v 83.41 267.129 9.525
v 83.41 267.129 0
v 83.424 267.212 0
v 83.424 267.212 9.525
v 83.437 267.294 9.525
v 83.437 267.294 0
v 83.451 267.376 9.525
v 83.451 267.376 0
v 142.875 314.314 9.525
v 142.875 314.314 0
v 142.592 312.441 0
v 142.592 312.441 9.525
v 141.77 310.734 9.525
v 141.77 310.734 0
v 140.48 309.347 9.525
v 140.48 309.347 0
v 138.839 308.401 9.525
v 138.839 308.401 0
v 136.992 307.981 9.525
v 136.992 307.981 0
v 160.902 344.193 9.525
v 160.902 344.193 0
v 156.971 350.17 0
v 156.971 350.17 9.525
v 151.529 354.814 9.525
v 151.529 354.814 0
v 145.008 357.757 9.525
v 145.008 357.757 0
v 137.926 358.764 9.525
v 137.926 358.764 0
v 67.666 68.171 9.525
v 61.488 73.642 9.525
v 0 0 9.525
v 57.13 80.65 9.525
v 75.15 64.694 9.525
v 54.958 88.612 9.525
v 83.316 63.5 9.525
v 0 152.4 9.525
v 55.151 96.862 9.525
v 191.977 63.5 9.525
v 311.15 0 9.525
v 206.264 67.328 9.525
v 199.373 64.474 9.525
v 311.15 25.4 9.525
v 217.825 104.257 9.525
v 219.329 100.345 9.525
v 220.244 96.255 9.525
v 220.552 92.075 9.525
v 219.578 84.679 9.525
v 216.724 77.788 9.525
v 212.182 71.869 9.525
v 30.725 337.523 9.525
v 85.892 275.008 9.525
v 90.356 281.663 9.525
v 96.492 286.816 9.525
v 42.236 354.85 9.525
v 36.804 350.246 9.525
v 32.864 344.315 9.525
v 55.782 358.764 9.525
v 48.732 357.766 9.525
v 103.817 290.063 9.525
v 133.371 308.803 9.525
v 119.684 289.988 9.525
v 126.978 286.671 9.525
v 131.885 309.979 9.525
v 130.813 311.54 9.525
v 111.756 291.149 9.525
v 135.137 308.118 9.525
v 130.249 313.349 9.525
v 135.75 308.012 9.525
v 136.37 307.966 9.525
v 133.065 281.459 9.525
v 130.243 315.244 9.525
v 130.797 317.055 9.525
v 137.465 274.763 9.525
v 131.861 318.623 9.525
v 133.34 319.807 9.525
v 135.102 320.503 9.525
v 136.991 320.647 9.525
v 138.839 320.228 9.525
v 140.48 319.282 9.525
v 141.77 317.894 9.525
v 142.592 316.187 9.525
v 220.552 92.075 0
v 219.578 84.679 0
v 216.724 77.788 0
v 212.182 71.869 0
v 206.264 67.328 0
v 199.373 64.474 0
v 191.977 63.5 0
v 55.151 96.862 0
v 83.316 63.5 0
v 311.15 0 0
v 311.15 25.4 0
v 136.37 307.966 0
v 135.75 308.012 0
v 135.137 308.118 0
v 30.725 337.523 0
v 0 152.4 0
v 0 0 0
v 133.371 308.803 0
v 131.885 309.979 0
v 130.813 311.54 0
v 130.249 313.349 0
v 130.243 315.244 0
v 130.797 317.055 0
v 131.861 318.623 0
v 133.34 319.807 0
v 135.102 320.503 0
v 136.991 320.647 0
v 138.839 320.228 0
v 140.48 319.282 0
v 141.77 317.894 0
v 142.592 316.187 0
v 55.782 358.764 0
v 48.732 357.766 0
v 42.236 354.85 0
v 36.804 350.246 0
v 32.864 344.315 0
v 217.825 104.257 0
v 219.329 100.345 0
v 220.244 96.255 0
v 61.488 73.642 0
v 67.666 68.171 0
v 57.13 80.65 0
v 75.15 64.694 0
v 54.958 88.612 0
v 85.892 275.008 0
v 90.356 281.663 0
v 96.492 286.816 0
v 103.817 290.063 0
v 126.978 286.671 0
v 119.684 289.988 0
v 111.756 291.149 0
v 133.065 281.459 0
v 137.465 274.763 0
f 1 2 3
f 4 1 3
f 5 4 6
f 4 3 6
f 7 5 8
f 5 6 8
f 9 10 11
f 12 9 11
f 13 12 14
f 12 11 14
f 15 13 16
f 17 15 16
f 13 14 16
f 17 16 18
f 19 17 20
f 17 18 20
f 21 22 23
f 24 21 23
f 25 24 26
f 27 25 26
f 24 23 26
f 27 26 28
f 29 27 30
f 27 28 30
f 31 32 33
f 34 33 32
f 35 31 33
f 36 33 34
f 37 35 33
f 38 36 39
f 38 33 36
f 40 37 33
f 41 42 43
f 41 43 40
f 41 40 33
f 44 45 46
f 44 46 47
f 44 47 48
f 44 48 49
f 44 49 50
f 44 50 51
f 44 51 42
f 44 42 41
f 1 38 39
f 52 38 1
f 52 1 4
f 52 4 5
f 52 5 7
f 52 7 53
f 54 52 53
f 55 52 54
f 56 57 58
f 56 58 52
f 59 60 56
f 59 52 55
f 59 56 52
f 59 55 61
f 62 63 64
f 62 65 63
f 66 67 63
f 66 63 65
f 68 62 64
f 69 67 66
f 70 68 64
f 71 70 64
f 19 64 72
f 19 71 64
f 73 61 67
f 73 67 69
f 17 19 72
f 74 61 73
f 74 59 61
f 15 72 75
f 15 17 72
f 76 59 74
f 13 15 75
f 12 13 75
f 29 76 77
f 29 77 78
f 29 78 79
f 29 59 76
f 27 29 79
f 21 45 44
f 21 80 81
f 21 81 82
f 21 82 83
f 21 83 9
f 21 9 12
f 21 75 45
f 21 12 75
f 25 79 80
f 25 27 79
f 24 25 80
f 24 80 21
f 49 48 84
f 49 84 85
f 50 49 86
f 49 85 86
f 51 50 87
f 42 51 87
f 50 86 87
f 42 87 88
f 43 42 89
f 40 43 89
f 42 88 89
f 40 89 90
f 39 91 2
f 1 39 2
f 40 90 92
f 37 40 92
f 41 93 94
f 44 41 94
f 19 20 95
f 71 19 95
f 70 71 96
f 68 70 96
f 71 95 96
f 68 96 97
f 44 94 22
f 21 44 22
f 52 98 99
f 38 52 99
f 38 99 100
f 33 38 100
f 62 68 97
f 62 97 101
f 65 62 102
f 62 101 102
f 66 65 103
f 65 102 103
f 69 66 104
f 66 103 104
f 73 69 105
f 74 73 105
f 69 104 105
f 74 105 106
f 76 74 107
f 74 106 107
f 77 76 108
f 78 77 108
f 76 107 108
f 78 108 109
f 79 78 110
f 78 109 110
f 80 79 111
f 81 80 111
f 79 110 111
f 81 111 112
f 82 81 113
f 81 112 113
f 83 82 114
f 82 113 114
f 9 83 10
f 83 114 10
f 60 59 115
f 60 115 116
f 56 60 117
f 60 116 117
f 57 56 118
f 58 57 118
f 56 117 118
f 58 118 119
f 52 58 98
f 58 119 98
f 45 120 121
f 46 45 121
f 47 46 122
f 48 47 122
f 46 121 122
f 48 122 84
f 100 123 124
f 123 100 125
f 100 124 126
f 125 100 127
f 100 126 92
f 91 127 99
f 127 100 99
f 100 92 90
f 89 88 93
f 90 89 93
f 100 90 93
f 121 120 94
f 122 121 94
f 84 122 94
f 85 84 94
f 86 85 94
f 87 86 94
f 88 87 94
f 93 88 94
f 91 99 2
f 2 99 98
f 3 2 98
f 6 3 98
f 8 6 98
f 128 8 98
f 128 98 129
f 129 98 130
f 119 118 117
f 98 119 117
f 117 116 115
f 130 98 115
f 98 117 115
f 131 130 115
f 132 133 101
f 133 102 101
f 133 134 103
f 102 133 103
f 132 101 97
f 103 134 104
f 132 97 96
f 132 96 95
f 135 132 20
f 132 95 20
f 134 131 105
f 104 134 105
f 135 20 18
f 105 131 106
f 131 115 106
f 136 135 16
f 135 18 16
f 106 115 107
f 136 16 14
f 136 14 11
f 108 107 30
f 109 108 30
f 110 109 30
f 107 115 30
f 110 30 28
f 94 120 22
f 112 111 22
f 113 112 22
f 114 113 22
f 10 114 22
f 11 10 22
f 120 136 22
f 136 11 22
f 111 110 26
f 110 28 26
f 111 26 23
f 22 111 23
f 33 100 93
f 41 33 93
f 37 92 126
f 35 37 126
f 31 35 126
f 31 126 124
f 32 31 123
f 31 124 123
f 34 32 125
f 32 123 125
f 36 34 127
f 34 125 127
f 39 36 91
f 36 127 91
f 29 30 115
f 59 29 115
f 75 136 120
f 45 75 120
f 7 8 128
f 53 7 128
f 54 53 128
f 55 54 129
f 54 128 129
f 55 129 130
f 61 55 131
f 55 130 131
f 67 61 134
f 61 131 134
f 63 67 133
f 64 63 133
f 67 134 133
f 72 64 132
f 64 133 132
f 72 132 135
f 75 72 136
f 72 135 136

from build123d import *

# Parameters (mm, degrees)
F1_DEPTH = 9.525


with BuildPart() as f1:
    # F0 (on Top) → F1 (new body)
    with BuildSketch(Plane.XY):
        with BuildLine():
            Line((0, 152.4), (0, 0))
            Line((0, 0), (311.15, 0))
            Line((311.15, 0), (311.15, 25.4))
            Line((311.15, 25.4), (160.901719, 344.192777))
            ThreePointArc((160.901719, 344.192777), (162.712271, 338.912413), (163.325663, 333.364072))
            ThreePointArc((163.325663, 333.364072), (155.552888, 315.076345), (136.99173, 307.981248))
            ThreePointArc((136.99173, 307.981248), (136.059369, 307.981167), (135.137047, 308.117615))
            ThreePointArc((135.137047, 308.117615), (112.564078, 334.760493), (137.925663, 358.764072))
            Line((137.925663, 358.764072), (55.782063, 358.764072))
            ThreePointArc((55.782063, 358.764072), (73.742576, 351.324585), (81.182063, 333.364072))
            ThreePointArc((81.182063, 333.364072), (53.695638, 308.04991), (30.724833, 337.522821))
            Line((30.724833, 337.522821), (0, 152.4))
        make_face()
        with BuildLine():
            ThreePointArc((83.451245, 267.376207), (107.748281, 290.885778), (137.465097, 274.762605))
            Line((137.465097, 274.762605), (217.824916, 104.257293))
            ThreePointArc((217.824916, 104.257293), (219.861787, 98.316884), (220.551853, 92.075))
            ThreePointArc((220.551853, 92.075), (212.182429, 71.869424), (191.976853, 63.5))
            Line((191.976853, 63.5), (83.315653, 63.5))
            ThreePointArc((83.315653, 63.5), (61.487623, 73.641806), (55.150963, 96.861752))
            Line((55.150963, 96.861752), (83.410288, 267.129432))
            ThreePointArc((83.410288, 267.129432), (83.430497, 267.252864), (83.451245, 267.376207))
        make_face(mode=Mode.SUBTRACT)
        with BuildLine():
            ThreePointArc((55.782063, 358.764072), (39.357573, 352.739214), (30.724833, 337.522821))
            ThreePointArc((30.724833, 337.522821), (53.695638, 308.04991), (81.182063, 333.364072))
            ThreePointArc((81.182063, 333.364072), (73.742576, 351.324585), (55.782063, 358.764072))
        make_face()
        with BuildLine():
            ThreePointArc((163.325663, 333.364072), (162.712271, 338.912413), (160.901719, 344.192777))
            ThreePointArc((160.901719, 344.192777), (151.529172, 354.81412), (137.925663, 358.764072))
            ThreePointArc((137.925663, 358.764072), (112.564078, 334.760493), (135.137047, 308.117615))
            ThreePointArc((135.137047, 308.117615), (132.555806, 319.270684), (142.875, 314.314072))
            ThreePointArc((142.875, 314.314072), (141.177216, 309.992107), (136.99173, 307.981248))
            ThreePointArc((136.99173, 307.981248), (155.552888, 315.076345), (163.325663, 333.364072))
        make_face()
    extrude(amount=F1_DEPTH)


solid = f1.part
